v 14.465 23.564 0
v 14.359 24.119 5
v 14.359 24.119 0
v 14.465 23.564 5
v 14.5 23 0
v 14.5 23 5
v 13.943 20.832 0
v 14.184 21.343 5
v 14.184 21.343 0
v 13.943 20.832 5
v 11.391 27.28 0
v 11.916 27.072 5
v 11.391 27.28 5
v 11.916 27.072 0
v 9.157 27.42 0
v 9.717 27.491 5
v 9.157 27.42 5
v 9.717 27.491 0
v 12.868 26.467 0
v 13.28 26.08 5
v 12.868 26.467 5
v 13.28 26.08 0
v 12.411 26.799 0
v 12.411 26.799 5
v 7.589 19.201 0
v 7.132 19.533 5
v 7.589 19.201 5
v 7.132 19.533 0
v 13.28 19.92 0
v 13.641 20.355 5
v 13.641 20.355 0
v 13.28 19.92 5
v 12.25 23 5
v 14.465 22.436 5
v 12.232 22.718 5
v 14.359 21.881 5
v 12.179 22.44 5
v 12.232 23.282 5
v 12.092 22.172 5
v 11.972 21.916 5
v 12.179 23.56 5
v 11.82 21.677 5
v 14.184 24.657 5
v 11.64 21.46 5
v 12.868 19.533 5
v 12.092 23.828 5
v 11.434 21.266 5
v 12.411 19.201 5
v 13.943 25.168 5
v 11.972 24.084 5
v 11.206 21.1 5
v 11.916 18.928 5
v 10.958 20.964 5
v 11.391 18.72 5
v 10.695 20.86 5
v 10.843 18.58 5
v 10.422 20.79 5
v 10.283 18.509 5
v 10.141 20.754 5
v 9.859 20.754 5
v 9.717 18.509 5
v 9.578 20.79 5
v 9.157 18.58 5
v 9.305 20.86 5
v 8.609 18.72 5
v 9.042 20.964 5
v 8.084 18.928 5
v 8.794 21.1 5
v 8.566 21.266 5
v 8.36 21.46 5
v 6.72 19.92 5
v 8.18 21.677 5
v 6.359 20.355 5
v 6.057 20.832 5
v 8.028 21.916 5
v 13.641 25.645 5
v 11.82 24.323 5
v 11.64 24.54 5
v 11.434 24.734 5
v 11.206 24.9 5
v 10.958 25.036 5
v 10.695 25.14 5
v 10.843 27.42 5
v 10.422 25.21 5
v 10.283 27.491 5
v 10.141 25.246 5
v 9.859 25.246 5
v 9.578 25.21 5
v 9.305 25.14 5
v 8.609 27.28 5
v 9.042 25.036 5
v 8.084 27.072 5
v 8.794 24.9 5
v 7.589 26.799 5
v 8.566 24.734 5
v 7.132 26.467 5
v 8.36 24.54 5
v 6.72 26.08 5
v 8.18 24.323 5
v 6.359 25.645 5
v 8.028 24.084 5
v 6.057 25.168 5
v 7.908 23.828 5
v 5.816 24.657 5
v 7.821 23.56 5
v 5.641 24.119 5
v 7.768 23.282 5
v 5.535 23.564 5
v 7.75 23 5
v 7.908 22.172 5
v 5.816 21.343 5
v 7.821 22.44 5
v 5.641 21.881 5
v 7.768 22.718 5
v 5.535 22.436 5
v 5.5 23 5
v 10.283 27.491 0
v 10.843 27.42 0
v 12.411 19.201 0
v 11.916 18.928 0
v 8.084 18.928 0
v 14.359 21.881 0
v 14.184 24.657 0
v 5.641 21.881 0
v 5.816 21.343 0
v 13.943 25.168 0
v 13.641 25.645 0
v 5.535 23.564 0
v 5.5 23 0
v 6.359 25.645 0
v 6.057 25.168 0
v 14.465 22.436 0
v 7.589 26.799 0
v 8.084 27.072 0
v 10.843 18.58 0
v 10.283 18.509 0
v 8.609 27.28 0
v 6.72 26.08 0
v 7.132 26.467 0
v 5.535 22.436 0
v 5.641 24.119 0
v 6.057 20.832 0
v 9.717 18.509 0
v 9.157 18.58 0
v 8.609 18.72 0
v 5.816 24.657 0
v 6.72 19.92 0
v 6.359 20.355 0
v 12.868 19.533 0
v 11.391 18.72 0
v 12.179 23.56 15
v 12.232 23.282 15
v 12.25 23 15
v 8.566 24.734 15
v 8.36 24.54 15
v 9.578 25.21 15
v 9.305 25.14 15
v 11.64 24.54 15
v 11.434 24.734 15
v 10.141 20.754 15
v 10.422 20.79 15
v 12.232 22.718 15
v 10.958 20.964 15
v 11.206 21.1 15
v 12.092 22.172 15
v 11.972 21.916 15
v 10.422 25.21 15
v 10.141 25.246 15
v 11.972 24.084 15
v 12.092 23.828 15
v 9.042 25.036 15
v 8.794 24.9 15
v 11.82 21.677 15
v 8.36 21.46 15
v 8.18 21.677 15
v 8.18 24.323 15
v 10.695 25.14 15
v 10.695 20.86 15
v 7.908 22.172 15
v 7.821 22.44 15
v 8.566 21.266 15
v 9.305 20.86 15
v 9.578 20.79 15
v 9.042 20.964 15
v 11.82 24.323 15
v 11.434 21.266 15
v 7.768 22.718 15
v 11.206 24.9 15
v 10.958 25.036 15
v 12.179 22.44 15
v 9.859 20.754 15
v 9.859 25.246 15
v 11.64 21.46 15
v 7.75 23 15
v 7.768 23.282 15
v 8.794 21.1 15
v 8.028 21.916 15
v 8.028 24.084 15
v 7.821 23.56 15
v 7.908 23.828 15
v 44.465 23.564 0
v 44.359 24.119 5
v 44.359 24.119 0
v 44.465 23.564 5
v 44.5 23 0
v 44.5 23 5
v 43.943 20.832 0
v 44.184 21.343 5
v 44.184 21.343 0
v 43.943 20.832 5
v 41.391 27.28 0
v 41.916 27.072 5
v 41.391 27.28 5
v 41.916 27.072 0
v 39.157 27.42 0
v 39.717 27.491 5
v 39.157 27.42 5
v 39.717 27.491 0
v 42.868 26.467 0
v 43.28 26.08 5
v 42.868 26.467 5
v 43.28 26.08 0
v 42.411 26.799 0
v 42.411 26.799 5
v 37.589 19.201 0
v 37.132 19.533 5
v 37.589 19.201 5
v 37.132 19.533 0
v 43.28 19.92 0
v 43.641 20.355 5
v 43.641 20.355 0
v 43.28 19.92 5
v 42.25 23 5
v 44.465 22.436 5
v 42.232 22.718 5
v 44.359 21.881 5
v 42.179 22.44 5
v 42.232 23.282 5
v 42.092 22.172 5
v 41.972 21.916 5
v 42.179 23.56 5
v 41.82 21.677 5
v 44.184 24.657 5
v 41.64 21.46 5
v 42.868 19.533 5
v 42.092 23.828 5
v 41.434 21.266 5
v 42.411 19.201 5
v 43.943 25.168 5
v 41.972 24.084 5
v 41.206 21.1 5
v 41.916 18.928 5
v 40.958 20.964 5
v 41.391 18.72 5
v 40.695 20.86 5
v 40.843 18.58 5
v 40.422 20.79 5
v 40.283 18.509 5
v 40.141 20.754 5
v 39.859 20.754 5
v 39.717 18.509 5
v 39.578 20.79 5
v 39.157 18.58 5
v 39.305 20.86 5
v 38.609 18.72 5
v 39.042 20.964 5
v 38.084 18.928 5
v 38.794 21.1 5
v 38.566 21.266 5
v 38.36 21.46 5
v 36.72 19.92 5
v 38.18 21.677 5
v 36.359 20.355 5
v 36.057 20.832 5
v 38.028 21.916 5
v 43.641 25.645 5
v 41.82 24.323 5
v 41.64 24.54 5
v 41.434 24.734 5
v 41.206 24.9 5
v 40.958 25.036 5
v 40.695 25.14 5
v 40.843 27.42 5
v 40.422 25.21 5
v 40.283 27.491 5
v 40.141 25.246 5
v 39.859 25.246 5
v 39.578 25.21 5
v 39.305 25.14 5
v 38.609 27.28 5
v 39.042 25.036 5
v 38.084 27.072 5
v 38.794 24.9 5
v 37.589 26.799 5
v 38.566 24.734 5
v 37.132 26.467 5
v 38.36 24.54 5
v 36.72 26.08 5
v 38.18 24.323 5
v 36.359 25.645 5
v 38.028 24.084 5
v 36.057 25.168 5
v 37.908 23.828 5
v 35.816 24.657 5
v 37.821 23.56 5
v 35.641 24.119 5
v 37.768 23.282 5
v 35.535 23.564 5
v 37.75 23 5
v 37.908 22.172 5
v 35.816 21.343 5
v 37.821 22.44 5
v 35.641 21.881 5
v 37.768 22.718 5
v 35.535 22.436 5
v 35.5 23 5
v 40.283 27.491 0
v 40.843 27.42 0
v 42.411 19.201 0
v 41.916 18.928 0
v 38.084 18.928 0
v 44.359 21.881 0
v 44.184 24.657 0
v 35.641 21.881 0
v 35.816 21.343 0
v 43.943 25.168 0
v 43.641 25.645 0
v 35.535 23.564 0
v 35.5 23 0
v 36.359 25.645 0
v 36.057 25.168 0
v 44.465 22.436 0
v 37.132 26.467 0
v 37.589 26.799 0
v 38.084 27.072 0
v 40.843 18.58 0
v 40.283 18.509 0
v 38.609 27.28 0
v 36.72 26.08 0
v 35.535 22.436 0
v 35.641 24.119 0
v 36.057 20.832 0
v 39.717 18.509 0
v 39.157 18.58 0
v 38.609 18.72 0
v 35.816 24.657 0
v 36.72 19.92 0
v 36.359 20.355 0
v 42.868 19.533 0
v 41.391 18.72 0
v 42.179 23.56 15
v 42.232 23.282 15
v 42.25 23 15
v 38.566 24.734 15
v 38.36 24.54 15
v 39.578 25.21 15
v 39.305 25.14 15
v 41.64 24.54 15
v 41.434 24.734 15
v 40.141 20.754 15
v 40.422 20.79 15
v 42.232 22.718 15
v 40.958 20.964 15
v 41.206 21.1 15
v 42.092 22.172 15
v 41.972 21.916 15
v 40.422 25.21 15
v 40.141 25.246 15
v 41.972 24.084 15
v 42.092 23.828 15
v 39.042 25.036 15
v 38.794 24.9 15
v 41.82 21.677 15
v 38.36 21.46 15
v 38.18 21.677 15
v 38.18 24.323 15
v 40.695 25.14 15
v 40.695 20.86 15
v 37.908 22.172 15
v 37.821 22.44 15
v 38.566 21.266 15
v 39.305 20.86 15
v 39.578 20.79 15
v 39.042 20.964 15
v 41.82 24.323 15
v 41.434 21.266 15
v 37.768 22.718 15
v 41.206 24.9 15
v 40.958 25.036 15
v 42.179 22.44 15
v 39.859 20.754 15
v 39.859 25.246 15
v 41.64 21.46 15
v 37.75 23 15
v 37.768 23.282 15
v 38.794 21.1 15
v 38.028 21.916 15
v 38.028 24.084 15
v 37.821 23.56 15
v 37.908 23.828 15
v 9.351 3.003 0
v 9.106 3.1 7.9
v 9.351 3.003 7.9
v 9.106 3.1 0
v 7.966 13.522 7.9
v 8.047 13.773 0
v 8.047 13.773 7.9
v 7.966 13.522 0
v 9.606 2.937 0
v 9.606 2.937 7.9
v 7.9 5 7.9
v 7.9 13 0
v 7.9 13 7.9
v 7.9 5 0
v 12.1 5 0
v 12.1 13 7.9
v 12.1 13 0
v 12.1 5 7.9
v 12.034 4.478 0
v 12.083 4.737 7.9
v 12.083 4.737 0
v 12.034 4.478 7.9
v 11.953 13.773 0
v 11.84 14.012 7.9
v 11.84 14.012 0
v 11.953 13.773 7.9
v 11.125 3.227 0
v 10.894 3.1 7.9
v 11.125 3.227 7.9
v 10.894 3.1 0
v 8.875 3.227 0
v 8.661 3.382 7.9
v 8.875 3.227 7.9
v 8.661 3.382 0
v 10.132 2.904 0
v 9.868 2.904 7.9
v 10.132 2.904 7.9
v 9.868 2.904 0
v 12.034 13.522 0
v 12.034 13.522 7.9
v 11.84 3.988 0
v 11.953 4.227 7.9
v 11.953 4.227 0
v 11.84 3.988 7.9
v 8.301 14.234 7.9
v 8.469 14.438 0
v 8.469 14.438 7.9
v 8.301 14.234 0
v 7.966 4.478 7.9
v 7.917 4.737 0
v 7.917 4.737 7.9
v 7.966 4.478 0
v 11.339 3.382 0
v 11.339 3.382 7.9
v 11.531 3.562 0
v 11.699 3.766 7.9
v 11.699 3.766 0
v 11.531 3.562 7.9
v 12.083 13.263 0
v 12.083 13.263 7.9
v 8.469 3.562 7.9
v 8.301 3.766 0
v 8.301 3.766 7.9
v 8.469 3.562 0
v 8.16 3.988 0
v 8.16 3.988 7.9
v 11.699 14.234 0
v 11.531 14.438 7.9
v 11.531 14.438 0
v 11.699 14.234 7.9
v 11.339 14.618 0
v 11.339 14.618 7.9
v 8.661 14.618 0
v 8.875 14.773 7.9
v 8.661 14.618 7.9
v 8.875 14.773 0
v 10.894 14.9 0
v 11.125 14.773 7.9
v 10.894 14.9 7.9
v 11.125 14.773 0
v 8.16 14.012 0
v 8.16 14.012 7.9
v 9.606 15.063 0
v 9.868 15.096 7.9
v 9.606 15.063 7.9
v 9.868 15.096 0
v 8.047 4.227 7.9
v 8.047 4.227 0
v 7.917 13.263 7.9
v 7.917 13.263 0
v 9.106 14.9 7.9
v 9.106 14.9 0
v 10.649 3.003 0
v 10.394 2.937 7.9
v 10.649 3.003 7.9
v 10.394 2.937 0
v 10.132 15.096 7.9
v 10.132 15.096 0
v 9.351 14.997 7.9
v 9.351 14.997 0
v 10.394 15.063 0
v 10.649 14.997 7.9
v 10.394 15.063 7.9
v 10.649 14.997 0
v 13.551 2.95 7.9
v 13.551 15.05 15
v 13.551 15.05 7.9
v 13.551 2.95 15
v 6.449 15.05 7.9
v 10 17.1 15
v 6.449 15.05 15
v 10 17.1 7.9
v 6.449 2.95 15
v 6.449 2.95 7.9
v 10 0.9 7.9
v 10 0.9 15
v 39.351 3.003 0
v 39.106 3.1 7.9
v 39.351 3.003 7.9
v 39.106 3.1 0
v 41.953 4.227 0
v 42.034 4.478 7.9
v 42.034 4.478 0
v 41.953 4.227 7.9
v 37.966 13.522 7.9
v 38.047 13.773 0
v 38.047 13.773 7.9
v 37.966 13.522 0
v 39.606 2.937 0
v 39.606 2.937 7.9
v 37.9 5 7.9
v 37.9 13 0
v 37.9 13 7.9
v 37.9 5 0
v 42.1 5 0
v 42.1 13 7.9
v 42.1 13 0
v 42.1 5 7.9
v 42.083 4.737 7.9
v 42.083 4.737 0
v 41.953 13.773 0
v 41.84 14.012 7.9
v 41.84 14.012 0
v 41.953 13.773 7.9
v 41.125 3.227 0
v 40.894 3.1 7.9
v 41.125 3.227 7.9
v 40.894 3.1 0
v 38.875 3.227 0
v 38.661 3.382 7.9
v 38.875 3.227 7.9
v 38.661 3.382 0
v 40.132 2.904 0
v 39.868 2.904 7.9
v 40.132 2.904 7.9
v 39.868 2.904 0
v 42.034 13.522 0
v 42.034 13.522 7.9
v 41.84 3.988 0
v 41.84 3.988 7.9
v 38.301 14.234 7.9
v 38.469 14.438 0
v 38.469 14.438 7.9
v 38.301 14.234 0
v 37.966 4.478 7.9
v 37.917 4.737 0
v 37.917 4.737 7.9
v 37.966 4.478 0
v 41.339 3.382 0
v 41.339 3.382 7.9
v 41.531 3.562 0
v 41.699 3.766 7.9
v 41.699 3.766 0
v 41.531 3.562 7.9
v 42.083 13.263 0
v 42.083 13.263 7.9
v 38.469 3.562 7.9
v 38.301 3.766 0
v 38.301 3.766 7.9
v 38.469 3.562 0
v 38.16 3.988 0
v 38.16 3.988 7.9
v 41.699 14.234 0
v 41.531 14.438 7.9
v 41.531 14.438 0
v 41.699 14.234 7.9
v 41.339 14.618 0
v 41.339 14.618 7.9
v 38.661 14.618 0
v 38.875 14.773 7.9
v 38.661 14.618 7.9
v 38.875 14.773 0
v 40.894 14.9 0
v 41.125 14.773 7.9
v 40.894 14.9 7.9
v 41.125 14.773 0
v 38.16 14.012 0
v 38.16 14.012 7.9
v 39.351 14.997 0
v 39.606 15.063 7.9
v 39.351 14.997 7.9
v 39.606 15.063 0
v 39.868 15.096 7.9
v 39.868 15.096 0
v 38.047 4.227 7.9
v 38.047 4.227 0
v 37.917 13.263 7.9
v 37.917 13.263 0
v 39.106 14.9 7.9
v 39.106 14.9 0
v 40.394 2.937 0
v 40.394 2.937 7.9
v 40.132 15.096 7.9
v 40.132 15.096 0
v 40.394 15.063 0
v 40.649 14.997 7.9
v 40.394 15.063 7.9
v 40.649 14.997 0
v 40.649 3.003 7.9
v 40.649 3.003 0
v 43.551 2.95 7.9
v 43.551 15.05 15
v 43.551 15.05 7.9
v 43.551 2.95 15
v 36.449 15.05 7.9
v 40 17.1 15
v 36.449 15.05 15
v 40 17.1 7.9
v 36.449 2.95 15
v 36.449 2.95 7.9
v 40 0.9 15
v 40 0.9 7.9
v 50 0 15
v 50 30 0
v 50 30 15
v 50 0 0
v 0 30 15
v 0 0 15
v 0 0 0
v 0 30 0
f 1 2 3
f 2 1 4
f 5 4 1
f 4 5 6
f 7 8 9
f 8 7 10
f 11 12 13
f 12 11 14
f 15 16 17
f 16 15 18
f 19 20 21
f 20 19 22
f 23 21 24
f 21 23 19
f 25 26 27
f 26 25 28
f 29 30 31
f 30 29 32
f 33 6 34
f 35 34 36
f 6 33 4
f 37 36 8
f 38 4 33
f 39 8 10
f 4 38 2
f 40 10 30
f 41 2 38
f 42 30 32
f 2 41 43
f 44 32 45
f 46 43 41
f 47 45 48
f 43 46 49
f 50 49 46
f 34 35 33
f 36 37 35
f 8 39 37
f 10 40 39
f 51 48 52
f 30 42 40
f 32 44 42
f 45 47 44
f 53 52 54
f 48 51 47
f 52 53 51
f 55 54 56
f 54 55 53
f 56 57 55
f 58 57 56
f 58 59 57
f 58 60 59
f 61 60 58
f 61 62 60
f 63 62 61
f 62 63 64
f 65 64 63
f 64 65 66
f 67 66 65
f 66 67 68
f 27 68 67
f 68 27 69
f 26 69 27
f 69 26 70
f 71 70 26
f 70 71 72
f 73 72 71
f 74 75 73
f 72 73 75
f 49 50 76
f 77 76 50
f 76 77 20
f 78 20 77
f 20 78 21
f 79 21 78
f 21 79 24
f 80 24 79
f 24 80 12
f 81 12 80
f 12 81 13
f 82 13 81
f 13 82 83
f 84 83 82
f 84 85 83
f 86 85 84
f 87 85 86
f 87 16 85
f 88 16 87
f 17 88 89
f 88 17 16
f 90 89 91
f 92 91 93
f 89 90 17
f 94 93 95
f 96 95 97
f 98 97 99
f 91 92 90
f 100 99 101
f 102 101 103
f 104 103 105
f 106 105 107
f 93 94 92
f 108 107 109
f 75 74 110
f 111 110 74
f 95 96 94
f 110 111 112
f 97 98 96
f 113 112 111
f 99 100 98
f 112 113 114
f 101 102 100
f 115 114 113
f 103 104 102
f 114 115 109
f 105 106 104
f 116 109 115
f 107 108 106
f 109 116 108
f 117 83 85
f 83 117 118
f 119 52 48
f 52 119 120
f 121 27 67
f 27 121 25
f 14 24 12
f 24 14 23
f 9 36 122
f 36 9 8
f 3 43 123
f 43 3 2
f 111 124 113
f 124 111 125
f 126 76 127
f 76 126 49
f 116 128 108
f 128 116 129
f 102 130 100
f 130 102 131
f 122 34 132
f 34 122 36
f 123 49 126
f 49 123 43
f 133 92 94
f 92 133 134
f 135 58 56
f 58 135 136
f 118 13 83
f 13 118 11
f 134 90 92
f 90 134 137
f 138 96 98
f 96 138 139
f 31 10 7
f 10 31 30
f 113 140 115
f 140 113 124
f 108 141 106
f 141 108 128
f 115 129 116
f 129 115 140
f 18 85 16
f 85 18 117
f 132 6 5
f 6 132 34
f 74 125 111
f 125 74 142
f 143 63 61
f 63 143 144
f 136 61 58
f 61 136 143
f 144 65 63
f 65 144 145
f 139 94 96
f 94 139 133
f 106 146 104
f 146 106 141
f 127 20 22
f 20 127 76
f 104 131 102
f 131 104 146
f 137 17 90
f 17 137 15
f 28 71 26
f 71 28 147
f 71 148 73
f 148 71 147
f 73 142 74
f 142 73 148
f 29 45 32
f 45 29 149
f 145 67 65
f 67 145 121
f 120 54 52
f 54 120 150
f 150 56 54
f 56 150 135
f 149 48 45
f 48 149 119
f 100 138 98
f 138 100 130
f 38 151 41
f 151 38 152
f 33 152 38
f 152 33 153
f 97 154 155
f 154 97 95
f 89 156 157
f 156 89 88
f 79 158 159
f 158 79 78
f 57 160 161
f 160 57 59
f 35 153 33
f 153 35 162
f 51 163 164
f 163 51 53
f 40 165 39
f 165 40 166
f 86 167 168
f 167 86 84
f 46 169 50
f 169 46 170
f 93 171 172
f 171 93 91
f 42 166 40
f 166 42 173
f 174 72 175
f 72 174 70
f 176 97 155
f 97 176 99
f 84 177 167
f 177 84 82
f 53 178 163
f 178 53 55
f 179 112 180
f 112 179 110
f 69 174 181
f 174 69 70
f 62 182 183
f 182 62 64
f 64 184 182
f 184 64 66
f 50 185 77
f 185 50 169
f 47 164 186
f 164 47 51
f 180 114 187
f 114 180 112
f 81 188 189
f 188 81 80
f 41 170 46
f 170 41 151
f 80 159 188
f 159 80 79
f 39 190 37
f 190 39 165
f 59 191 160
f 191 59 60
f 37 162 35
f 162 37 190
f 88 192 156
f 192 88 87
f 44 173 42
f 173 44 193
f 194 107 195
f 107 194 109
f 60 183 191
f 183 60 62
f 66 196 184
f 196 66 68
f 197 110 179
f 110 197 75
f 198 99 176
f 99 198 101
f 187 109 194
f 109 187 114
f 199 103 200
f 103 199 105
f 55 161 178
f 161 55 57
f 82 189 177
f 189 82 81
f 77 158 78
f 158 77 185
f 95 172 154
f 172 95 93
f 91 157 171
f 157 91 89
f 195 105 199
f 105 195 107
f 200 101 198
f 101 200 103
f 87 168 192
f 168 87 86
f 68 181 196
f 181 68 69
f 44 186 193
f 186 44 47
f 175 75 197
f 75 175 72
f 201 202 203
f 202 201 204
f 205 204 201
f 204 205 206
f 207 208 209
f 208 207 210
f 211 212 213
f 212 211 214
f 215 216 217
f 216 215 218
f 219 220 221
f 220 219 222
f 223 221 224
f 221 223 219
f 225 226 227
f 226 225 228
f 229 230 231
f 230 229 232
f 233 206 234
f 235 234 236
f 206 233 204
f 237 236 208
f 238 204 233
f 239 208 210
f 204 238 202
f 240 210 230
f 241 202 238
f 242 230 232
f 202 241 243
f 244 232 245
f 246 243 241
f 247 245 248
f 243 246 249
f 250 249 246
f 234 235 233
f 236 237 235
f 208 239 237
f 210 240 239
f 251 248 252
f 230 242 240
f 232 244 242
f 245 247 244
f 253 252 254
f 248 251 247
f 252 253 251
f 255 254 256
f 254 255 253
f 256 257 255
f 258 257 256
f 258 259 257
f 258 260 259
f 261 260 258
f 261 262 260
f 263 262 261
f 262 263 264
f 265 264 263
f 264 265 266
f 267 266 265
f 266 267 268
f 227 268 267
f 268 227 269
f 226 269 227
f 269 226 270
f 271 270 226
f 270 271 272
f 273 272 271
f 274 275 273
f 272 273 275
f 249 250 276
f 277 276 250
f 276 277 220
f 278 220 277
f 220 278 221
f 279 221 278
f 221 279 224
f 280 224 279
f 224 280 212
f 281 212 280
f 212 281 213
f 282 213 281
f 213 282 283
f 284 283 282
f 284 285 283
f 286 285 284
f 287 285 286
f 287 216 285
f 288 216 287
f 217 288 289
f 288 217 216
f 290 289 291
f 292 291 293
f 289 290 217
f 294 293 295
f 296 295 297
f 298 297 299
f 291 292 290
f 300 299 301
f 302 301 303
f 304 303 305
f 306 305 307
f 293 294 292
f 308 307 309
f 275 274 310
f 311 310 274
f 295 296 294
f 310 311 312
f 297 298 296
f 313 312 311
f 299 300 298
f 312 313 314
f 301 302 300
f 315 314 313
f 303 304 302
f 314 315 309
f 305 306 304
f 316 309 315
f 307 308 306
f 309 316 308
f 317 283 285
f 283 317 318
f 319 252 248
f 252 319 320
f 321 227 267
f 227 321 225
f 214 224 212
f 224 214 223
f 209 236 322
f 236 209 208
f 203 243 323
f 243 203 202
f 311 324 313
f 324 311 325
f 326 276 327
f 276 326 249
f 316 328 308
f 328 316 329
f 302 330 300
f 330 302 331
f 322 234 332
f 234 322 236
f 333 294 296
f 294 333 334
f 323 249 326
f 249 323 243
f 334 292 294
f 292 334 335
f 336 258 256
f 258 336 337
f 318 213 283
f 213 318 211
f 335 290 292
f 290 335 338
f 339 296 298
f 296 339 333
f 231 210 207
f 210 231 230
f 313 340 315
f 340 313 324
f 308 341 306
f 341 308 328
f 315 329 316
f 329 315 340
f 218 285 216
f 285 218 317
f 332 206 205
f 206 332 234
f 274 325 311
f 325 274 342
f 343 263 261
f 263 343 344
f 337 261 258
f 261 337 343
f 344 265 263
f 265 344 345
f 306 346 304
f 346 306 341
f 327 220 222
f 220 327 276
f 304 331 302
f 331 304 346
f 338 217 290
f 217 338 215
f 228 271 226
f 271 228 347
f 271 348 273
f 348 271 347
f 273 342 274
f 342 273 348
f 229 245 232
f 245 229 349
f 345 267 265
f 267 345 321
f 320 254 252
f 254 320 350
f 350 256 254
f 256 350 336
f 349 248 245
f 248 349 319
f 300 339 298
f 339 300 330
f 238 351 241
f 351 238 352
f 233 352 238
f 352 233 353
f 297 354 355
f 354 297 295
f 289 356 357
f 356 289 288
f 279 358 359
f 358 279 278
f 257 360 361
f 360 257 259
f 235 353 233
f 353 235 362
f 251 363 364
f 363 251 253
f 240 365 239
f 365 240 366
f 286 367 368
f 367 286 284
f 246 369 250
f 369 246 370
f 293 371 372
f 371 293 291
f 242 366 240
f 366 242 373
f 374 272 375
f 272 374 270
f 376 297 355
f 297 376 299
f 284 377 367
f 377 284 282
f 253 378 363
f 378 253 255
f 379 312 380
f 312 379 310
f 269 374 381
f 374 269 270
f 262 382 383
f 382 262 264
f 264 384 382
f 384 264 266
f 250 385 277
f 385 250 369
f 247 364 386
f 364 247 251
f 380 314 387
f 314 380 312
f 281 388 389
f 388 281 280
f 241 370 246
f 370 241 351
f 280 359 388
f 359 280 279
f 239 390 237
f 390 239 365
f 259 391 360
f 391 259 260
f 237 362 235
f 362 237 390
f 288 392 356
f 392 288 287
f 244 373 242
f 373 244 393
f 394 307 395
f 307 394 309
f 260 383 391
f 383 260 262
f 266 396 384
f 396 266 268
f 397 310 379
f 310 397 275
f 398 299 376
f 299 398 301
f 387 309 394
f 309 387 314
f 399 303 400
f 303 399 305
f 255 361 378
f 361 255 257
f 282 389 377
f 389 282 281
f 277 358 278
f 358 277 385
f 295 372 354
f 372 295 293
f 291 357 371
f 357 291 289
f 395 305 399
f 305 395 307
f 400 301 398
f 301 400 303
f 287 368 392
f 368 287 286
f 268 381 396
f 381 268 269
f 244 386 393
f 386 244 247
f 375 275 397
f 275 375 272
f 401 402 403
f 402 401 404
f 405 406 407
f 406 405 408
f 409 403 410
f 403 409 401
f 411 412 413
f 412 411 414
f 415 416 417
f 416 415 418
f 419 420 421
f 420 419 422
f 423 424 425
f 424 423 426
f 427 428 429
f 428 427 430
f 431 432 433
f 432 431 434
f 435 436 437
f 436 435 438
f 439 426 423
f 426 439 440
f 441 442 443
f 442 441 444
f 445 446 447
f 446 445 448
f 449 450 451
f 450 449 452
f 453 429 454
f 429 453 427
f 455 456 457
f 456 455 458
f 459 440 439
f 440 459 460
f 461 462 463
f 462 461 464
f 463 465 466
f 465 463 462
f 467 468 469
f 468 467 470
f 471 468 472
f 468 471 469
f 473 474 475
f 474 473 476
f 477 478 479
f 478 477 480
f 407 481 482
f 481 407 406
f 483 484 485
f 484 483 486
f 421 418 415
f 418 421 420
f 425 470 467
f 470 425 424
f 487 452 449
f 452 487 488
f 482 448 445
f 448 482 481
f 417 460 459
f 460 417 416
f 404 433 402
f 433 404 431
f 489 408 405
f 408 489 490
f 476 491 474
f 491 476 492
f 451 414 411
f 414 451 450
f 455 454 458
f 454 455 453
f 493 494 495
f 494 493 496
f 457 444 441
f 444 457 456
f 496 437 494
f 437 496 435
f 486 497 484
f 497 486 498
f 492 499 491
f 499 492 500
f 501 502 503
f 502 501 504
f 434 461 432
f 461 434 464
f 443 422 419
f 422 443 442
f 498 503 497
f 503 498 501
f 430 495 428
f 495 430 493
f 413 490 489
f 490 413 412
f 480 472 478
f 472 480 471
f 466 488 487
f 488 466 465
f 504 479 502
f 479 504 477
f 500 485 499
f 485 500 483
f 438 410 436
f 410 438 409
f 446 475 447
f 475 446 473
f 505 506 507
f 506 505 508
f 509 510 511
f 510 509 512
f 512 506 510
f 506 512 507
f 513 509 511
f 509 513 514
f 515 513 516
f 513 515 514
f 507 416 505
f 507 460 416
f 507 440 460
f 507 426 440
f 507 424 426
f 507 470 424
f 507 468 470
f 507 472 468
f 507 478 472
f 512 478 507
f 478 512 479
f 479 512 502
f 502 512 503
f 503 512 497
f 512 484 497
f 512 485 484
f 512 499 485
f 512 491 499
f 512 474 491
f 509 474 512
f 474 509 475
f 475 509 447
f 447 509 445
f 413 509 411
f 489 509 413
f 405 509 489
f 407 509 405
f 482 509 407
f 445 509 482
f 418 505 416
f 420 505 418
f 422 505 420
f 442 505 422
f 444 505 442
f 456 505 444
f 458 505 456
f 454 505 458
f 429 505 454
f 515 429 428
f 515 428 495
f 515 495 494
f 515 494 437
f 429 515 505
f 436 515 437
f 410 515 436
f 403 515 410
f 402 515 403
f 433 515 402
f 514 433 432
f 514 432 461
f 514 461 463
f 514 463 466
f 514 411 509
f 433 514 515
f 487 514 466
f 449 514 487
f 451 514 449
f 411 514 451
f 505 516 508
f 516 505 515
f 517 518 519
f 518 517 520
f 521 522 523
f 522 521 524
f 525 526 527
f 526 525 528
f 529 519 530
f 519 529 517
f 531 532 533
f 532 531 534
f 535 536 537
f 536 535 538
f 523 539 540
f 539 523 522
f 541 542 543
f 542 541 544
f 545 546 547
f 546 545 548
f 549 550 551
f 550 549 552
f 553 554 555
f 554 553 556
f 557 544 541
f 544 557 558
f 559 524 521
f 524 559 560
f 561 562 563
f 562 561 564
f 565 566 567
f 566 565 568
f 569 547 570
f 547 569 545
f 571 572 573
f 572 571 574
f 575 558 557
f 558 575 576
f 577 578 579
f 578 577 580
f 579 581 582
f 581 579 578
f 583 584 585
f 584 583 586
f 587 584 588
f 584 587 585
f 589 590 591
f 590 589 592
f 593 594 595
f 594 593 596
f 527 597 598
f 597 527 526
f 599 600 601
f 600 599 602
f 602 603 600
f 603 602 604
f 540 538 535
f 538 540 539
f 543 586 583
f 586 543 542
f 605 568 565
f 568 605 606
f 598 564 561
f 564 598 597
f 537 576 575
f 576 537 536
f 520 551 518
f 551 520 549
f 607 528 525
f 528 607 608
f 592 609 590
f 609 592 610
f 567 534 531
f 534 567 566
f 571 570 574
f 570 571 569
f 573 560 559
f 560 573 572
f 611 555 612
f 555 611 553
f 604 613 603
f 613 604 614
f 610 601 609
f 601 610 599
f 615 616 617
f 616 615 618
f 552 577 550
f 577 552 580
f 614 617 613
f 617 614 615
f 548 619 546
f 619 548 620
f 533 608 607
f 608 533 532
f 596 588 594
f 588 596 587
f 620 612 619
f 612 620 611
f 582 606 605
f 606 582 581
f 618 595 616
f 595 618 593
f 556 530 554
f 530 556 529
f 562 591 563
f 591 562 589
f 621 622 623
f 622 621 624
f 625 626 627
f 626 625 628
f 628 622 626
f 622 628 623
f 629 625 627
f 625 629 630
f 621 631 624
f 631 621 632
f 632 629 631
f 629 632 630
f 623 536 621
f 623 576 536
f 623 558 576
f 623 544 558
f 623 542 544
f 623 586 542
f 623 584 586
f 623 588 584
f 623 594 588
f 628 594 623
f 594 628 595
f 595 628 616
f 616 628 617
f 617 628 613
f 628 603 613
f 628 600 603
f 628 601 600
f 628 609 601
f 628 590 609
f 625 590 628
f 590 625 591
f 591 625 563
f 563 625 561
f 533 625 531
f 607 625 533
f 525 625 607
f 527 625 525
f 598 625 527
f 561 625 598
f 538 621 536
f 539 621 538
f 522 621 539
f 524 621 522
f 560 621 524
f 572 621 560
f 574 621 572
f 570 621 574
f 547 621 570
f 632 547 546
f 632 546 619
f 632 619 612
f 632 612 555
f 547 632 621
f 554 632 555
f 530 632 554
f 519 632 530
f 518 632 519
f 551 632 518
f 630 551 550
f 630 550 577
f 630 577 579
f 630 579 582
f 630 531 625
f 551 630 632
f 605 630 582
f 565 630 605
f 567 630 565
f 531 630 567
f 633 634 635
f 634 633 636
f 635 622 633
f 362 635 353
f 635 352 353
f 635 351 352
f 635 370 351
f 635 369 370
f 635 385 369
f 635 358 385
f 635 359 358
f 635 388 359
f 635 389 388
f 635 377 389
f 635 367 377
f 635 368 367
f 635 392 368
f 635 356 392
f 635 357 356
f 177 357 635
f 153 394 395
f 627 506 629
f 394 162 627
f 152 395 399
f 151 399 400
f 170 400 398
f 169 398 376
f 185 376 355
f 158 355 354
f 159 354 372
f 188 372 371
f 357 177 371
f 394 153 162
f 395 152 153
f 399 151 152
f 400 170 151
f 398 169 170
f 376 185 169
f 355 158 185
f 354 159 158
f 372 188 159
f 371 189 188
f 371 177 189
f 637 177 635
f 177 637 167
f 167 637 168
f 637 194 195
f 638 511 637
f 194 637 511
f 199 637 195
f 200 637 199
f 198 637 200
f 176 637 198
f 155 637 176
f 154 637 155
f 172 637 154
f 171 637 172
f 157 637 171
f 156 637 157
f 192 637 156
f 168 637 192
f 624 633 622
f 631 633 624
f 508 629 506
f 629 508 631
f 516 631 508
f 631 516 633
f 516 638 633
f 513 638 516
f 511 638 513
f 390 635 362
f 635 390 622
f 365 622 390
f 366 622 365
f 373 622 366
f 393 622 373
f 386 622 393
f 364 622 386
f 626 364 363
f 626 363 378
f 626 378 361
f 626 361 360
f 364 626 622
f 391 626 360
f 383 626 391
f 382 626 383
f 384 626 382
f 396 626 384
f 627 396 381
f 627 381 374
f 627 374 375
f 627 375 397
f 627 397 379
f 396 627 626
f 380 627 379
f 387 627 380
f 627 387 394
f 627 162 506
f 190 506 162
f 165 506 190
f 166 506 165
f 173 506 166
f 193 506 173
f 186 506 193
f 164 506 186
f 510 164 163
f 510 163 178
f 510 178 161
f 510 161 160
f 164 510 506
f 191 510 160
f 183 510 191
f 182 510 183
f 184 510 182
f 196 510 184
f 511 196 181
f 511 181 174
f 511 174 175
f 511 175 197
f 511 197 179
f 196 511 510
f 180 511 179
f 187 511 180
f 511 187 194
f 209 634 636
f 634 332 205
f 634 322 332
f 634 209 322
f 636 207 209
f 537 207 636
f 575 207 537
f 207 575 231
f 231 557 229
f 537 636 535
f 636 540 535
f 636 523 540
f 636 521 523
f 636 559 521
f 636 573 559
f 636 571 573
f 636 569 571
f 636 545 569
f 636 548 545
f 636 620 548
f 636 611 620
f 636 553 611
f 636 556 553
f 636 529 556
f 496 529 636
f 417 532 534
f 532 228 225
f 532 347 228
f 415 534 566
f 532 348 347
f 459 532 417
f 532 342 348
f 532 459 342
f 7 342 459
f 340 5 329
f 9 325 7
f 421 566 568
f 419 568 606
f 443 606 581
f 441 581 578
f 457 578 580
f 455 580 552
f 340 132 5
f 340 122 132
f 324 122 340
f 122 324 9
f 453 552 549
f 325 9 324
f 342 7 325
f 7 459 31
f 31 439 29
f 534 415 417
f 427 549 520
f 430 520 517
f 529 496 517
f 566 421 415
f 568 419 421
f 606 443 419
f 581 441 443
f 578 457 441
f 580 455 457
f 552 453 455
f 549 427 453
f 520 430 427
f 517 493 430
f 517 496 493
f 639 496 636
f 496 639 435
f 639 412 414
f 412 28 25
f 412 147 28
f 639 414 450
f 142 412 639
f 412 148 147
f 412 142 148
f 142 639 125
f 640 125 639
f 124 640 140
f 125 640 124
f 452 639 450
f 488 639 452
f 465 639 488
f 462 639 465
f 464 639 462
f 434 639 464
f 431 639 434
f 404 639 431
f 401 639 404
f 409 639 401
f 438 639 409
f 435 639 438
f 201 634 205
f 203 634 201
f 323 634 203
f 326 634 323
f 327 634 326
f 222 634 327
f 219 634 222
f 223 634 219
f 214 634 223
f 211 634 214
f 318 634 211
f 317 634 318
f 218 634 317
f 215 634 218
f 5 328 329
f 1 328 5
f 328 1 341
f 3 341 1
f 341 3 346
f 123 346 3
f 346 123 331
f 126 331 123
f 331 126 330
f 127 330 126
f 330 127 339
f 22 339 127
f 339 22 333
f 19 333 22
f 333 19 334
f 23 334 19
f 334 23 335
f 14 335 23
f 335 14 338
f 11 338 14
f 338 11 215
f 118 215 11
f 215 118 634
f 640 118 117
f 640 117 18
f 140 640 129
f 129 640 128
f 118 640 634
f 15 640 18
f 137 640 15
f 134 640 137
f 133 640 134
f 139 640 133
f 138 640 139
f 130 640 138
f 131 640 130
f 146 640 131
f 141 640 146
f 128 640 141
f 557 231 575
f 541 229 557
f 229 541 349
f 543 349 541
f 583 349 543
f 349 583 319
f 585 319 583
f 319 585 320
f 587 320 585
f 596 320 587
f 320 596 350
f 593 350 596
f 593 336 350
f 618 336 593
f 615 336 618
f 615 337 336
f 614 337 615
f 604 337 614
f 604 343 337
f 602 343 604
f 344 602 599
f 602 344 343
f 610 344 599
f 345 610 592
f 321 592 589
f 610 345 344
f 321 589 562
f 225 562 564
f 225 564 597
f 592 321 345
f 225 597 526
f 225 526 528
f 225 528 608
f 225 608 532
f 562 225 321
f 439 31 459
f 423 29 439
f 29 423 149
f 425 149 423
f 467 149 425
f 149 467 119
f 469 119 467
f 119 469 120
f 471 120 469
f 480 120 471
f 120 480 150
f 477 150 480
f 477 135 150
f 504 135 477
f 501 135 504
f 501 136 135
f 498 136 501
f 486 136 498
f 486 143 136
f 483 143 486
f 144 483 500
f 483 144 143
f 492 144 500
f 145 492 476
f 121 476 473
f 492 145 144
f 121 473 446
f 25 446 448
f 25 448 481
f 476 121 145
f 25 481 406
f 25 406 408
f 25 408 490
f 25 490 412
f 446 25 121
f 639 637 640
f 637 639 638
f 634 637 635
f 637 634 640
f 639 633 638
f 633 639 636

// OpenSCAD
$fn=50;
LEN=30;
DIST=30;
WIDTH=50;

module screw() {
    translate([0,0,-0.1]) {
        cylinder(d=9,h=5.1);
    }
    translate([0,0,4.9]){
        cylinder(d=4.5,h=10.2);
    }
}

module hole() {
    
}

module slot(length) {
    hull(){
        translate([0,0,-0.1]) {
            cylinder(d=4.2,h=8.1);
        }
        translate([0,length,0]) {
            translate([0,0,-0.1]) {
                cylinder(d=4.2,h=8.1);
            }
        }
    }
    hull(){
        translate([0,0,7.9]){
            rotate([0,0,30]){
                cylinder(d=8.2,h=7.2,$fn=6);
            }
        }
        translate([0,length,0]) {
            translate([0,0,7.9]){
                rotate([0,0,30]) {
                    cylinder(d=8.2,h=7.2,$fn=6);
                }
            }
        }
    }
}

module cutout_slot(){
    slot(LEN-22);
    translate([DIST,0,0]) {
        slot(LEN-22);
    }
}

module cutout_screw() {
    screw();
    translate([DIST,0,0]) {
        screw();
    }
}
module adapterplate() {
    width=((WIDTH-20)<DIST)?(DIST+20):WIDTH;

    difference(){
        cube([width,LEN,15]);
        union(){
            translate([((width-DIST) / 2.0), LEN-7,0]){
                cutout_screw();
            }
            translate([((width-DIST)/2.0) ,5,0]){
                cutout_slot();
            }
        }
    }
    
}

adapterplate();
